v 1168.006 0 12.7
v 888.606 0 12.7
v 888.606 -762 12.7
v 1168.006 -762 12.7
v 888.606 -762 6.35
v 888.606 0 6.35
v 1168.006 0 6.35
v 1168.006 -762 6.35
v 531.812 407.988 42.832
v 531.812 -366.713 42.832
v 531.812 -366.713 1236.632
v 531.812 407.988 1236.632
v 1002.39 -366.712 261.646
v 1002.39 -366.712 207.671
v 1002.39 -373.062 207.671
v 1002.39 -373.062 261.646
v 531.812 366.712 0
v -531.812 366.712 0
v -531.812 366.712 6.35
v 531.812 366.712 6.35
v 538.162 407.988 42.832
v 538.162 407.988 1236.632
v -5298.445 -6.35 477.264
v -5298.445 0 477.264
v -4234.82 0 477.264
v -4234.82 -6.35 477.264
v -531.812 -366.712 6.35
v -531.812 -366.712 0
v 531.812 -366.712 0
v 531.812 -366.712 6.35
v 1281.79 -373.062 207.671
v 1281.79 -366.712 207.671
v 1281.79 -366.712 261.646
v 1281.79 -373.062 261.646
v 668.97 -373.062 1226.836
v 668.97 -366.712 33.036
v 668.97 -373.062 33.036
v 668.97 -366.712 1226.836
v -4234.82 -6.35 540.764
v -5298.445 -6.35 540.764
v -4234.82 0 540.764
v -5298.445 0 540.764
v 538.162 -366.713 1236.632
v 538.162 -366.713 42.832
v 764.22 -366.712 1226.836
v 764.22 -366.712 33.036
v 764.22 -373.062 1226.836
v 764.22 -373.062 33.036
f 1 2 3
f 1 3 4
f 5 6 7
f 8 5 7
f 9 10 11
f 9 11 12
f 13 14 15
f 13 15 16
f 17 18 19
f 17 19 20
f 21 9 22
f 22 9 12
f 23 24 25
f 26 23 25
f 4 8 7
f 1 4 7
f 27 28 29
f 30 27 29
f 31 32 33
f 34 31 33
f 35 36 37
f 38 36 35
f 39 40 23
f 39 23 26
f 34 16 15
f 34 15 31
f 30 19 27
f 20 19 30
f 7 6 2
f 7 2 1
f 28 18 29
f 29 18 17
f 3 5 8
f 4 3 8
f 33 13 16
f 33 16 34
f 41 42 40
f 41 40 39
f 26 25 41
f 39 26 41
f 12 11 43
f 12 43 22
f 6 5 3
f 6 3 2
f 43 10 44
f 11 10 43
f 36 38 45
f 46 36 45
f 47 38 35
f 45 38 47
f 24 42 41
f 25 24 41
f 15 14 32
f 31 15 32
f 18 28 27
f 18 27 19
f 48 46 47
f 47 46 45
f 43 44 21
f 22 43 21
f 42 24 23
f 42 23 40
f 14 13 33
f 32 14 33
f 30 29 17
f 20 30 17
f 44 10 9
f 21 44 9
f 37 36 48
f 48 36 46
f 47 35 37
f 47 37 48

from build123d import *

# Parameters (mm, degrees)
F0_W      = 1063.625
F0_H      = 733.425
F1_DEPTH  = 6.35
F2_W      = 774.7
F2_H      = 1193.8
F3_DEPTH  = 6.35
F4_W      = 95.25
F4_H      = 1193.8
F5_DEPTH  = 6.35
F6_W      = 279.4
F6_H      = 762
F7_DEPTH  = 6.35
F8_W      = 279.4
F8_H      = 53.975
F9_DEPTH  = 6.35
F10_W     = 1063.625
F10_H     = 63.5
F11_DEPTH = 6.35


with BuildPart() as f1:
    # F0 (on Top) → F1 (new body)
    with BuildSketch(Plane.XY):
        Rectangle(F0_W, F0_H)
    extrude(amount=F1_DEPTH)


with BuildPart() as f3:
    # F2 (on face) → F3 (new body)
    with BuildSketch(Plane.YZ.offset(531.8125)):
        with Locations((20.6375, 639.731545)):
            Rectangle(F2_W, F2_H)
    extrude(amount=F3_DEPTH)


with BuildPart() as f5:
    # F4 (on face) → F5 (new body)
    with BuildSketch(Plane.XZ.offset(366.7125)):
        with Locations((716.594691, 629.936415)):
            Rectangle(F4_W, F4_H)
    extrude(amount=F5_DEPTH)


with BuildPart() as f7:
    # F6 (on face) → F7 (new body)
    with BuildSketch(Plane.XY.offset(6.35)):
        with Locations((1028.305773, -381)):
            Rectangle(F6_W, F6_H)
    extrude(amount=F7_DEPTH)


with BuildPart() as f9:
    # F8 (on face) → F9 (new body)
    with BuildSketch(Plane.XZ.offset(366.7125)):
        with Locations((1142.090137, 234.658189)):
            Rectangle(F8_W, F8_H)
    extrude(amount=F9_DEPTH)


with BuildPart() as f11:
    # F10 (on Front) → F11 (new body)
    with BuildSketch(Plane.XZ):
        with Locations((-4766.632781, 509.014101)):
            Rectangle(F10_W, F10_H)
    extrude(amount=F11_DEPTH)


solid = Compound([f1.part, f3.part, f5.part, f7.part, f9.part, f11.part])
